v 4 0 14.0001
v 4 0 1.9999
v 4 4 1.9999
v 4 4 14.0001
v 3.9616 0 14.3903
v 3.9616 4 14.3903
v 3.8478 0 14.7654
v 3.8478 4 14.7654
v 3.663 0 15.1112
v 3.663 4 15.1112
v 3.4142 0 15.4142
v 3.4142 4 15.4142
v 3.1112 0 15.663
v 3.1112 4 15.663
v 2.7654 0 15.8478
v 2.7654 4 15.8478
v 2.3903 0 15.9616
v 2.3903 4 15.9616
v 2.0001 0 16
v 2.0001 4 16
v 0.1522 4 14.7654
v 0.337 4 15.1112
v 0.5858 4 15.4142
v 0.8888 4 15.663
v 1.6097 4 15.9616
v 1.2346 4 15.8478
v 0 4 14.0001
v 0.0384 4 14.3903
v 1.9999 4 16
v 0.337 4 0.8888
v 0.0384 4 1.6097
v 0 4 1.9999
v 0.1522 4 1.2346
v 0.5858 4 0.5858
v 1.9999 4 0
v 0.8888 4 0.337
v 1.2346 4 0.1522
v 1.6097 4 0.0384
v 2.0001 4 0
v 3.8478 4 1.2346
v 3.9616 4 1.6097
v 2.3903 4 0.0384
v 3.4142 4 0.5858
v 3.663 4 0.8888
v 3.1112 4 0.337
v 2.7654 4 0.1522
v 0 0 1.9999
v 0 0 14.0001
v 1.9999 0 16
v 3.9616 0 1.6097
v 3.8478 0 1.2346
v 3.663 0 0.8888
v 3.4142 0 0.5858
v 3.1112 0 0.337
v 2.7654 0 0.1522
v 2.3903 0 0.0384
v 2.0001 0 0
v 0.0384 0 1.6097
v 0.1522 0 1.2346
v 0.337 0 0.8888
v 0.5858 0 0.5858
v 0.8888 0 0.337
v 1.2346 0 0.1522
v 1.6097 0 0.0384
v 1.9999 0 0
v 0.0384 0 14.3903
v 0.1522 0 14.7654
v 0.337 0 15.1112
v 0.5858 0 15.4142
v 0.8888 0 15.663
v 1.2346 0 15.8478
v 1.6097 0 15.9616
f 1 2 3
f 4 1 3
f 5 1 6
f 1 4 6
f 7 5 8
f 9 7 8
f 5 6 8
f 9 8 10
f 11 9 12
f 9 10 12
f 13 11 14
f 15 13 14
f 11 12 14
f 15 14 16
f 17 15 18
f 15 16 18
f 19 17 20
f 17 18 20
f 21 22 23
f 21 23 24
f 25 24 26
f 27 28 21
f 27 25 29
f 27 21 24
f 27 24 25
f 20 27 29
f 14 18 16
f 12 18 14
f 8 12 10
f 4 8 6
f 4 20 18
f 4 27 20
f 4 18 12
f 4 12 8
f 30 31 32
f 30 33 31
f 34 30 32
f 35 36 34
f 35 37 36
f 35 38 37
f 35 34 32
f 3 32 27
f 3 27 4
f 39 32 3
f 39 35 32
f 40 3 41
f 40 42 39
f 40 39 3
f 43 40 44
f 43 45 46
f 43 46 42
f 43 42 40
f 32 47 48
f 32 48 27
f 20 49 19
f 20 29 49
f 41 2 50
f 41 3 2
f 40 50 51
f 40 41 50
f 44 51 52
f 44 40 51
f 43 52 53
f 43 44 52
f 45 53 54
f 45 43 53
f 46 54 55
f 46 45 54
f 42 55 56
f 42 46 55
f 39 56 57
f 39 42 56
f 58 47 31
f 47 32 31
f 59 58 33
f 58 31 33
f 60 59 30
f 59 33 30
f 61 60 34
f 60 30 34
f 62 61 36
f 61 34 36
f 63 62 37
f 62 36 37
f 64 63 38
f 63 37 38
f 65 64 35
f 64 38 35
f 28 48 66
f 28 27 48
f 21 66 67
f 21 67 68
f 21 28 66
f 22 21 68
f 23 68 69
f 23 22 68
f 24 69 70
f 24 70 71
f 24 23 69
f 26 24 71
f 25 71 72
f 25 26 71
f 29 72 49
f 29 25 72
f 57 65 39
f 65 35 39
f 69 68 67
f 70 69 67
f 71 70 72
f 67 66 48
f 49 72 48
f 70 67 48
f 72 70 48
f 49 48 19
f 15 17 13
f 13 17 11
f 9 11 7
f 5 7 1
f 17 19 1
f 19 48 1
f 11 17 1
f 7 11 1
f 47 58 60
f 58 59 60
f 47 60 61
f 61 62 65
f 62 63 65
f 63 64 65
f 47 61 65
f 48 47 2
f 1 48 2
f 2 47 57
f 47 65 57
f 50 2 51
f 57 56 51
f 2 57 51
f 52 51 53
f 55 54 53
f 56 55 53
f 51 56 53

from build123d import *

# Parameters (mm, degrees)
SKETCH1_W          = 4
SKETCH1_H          = 4
KEYEXTRUSION_DEPTH = 16
ENDRADII_R         = 2


with BuildPart() as part:
    # Sketch1 → KeyExtrusion (new body)
    with BuildSketch(Plane.XY):
        with Locations((2, 2)):
            Rectangle(SKETCH1_W, SKETCH1_H)
    extrude(amount=KEYEXTRUSION_DEPTH)

    # EndRadii
    endradii_edges = [part.edges().sort_by_distance(p)[0] for p in [
        (0, 2, 0),
        (4, 2, 0),
        (0, 2, 16),
        (4, 2, 16),
    ]]
    fillet(endradii_edges, radius=ENDRADII_R - 0.0001)  # a hair under: the kernel refuses the full size


solid = part.part
